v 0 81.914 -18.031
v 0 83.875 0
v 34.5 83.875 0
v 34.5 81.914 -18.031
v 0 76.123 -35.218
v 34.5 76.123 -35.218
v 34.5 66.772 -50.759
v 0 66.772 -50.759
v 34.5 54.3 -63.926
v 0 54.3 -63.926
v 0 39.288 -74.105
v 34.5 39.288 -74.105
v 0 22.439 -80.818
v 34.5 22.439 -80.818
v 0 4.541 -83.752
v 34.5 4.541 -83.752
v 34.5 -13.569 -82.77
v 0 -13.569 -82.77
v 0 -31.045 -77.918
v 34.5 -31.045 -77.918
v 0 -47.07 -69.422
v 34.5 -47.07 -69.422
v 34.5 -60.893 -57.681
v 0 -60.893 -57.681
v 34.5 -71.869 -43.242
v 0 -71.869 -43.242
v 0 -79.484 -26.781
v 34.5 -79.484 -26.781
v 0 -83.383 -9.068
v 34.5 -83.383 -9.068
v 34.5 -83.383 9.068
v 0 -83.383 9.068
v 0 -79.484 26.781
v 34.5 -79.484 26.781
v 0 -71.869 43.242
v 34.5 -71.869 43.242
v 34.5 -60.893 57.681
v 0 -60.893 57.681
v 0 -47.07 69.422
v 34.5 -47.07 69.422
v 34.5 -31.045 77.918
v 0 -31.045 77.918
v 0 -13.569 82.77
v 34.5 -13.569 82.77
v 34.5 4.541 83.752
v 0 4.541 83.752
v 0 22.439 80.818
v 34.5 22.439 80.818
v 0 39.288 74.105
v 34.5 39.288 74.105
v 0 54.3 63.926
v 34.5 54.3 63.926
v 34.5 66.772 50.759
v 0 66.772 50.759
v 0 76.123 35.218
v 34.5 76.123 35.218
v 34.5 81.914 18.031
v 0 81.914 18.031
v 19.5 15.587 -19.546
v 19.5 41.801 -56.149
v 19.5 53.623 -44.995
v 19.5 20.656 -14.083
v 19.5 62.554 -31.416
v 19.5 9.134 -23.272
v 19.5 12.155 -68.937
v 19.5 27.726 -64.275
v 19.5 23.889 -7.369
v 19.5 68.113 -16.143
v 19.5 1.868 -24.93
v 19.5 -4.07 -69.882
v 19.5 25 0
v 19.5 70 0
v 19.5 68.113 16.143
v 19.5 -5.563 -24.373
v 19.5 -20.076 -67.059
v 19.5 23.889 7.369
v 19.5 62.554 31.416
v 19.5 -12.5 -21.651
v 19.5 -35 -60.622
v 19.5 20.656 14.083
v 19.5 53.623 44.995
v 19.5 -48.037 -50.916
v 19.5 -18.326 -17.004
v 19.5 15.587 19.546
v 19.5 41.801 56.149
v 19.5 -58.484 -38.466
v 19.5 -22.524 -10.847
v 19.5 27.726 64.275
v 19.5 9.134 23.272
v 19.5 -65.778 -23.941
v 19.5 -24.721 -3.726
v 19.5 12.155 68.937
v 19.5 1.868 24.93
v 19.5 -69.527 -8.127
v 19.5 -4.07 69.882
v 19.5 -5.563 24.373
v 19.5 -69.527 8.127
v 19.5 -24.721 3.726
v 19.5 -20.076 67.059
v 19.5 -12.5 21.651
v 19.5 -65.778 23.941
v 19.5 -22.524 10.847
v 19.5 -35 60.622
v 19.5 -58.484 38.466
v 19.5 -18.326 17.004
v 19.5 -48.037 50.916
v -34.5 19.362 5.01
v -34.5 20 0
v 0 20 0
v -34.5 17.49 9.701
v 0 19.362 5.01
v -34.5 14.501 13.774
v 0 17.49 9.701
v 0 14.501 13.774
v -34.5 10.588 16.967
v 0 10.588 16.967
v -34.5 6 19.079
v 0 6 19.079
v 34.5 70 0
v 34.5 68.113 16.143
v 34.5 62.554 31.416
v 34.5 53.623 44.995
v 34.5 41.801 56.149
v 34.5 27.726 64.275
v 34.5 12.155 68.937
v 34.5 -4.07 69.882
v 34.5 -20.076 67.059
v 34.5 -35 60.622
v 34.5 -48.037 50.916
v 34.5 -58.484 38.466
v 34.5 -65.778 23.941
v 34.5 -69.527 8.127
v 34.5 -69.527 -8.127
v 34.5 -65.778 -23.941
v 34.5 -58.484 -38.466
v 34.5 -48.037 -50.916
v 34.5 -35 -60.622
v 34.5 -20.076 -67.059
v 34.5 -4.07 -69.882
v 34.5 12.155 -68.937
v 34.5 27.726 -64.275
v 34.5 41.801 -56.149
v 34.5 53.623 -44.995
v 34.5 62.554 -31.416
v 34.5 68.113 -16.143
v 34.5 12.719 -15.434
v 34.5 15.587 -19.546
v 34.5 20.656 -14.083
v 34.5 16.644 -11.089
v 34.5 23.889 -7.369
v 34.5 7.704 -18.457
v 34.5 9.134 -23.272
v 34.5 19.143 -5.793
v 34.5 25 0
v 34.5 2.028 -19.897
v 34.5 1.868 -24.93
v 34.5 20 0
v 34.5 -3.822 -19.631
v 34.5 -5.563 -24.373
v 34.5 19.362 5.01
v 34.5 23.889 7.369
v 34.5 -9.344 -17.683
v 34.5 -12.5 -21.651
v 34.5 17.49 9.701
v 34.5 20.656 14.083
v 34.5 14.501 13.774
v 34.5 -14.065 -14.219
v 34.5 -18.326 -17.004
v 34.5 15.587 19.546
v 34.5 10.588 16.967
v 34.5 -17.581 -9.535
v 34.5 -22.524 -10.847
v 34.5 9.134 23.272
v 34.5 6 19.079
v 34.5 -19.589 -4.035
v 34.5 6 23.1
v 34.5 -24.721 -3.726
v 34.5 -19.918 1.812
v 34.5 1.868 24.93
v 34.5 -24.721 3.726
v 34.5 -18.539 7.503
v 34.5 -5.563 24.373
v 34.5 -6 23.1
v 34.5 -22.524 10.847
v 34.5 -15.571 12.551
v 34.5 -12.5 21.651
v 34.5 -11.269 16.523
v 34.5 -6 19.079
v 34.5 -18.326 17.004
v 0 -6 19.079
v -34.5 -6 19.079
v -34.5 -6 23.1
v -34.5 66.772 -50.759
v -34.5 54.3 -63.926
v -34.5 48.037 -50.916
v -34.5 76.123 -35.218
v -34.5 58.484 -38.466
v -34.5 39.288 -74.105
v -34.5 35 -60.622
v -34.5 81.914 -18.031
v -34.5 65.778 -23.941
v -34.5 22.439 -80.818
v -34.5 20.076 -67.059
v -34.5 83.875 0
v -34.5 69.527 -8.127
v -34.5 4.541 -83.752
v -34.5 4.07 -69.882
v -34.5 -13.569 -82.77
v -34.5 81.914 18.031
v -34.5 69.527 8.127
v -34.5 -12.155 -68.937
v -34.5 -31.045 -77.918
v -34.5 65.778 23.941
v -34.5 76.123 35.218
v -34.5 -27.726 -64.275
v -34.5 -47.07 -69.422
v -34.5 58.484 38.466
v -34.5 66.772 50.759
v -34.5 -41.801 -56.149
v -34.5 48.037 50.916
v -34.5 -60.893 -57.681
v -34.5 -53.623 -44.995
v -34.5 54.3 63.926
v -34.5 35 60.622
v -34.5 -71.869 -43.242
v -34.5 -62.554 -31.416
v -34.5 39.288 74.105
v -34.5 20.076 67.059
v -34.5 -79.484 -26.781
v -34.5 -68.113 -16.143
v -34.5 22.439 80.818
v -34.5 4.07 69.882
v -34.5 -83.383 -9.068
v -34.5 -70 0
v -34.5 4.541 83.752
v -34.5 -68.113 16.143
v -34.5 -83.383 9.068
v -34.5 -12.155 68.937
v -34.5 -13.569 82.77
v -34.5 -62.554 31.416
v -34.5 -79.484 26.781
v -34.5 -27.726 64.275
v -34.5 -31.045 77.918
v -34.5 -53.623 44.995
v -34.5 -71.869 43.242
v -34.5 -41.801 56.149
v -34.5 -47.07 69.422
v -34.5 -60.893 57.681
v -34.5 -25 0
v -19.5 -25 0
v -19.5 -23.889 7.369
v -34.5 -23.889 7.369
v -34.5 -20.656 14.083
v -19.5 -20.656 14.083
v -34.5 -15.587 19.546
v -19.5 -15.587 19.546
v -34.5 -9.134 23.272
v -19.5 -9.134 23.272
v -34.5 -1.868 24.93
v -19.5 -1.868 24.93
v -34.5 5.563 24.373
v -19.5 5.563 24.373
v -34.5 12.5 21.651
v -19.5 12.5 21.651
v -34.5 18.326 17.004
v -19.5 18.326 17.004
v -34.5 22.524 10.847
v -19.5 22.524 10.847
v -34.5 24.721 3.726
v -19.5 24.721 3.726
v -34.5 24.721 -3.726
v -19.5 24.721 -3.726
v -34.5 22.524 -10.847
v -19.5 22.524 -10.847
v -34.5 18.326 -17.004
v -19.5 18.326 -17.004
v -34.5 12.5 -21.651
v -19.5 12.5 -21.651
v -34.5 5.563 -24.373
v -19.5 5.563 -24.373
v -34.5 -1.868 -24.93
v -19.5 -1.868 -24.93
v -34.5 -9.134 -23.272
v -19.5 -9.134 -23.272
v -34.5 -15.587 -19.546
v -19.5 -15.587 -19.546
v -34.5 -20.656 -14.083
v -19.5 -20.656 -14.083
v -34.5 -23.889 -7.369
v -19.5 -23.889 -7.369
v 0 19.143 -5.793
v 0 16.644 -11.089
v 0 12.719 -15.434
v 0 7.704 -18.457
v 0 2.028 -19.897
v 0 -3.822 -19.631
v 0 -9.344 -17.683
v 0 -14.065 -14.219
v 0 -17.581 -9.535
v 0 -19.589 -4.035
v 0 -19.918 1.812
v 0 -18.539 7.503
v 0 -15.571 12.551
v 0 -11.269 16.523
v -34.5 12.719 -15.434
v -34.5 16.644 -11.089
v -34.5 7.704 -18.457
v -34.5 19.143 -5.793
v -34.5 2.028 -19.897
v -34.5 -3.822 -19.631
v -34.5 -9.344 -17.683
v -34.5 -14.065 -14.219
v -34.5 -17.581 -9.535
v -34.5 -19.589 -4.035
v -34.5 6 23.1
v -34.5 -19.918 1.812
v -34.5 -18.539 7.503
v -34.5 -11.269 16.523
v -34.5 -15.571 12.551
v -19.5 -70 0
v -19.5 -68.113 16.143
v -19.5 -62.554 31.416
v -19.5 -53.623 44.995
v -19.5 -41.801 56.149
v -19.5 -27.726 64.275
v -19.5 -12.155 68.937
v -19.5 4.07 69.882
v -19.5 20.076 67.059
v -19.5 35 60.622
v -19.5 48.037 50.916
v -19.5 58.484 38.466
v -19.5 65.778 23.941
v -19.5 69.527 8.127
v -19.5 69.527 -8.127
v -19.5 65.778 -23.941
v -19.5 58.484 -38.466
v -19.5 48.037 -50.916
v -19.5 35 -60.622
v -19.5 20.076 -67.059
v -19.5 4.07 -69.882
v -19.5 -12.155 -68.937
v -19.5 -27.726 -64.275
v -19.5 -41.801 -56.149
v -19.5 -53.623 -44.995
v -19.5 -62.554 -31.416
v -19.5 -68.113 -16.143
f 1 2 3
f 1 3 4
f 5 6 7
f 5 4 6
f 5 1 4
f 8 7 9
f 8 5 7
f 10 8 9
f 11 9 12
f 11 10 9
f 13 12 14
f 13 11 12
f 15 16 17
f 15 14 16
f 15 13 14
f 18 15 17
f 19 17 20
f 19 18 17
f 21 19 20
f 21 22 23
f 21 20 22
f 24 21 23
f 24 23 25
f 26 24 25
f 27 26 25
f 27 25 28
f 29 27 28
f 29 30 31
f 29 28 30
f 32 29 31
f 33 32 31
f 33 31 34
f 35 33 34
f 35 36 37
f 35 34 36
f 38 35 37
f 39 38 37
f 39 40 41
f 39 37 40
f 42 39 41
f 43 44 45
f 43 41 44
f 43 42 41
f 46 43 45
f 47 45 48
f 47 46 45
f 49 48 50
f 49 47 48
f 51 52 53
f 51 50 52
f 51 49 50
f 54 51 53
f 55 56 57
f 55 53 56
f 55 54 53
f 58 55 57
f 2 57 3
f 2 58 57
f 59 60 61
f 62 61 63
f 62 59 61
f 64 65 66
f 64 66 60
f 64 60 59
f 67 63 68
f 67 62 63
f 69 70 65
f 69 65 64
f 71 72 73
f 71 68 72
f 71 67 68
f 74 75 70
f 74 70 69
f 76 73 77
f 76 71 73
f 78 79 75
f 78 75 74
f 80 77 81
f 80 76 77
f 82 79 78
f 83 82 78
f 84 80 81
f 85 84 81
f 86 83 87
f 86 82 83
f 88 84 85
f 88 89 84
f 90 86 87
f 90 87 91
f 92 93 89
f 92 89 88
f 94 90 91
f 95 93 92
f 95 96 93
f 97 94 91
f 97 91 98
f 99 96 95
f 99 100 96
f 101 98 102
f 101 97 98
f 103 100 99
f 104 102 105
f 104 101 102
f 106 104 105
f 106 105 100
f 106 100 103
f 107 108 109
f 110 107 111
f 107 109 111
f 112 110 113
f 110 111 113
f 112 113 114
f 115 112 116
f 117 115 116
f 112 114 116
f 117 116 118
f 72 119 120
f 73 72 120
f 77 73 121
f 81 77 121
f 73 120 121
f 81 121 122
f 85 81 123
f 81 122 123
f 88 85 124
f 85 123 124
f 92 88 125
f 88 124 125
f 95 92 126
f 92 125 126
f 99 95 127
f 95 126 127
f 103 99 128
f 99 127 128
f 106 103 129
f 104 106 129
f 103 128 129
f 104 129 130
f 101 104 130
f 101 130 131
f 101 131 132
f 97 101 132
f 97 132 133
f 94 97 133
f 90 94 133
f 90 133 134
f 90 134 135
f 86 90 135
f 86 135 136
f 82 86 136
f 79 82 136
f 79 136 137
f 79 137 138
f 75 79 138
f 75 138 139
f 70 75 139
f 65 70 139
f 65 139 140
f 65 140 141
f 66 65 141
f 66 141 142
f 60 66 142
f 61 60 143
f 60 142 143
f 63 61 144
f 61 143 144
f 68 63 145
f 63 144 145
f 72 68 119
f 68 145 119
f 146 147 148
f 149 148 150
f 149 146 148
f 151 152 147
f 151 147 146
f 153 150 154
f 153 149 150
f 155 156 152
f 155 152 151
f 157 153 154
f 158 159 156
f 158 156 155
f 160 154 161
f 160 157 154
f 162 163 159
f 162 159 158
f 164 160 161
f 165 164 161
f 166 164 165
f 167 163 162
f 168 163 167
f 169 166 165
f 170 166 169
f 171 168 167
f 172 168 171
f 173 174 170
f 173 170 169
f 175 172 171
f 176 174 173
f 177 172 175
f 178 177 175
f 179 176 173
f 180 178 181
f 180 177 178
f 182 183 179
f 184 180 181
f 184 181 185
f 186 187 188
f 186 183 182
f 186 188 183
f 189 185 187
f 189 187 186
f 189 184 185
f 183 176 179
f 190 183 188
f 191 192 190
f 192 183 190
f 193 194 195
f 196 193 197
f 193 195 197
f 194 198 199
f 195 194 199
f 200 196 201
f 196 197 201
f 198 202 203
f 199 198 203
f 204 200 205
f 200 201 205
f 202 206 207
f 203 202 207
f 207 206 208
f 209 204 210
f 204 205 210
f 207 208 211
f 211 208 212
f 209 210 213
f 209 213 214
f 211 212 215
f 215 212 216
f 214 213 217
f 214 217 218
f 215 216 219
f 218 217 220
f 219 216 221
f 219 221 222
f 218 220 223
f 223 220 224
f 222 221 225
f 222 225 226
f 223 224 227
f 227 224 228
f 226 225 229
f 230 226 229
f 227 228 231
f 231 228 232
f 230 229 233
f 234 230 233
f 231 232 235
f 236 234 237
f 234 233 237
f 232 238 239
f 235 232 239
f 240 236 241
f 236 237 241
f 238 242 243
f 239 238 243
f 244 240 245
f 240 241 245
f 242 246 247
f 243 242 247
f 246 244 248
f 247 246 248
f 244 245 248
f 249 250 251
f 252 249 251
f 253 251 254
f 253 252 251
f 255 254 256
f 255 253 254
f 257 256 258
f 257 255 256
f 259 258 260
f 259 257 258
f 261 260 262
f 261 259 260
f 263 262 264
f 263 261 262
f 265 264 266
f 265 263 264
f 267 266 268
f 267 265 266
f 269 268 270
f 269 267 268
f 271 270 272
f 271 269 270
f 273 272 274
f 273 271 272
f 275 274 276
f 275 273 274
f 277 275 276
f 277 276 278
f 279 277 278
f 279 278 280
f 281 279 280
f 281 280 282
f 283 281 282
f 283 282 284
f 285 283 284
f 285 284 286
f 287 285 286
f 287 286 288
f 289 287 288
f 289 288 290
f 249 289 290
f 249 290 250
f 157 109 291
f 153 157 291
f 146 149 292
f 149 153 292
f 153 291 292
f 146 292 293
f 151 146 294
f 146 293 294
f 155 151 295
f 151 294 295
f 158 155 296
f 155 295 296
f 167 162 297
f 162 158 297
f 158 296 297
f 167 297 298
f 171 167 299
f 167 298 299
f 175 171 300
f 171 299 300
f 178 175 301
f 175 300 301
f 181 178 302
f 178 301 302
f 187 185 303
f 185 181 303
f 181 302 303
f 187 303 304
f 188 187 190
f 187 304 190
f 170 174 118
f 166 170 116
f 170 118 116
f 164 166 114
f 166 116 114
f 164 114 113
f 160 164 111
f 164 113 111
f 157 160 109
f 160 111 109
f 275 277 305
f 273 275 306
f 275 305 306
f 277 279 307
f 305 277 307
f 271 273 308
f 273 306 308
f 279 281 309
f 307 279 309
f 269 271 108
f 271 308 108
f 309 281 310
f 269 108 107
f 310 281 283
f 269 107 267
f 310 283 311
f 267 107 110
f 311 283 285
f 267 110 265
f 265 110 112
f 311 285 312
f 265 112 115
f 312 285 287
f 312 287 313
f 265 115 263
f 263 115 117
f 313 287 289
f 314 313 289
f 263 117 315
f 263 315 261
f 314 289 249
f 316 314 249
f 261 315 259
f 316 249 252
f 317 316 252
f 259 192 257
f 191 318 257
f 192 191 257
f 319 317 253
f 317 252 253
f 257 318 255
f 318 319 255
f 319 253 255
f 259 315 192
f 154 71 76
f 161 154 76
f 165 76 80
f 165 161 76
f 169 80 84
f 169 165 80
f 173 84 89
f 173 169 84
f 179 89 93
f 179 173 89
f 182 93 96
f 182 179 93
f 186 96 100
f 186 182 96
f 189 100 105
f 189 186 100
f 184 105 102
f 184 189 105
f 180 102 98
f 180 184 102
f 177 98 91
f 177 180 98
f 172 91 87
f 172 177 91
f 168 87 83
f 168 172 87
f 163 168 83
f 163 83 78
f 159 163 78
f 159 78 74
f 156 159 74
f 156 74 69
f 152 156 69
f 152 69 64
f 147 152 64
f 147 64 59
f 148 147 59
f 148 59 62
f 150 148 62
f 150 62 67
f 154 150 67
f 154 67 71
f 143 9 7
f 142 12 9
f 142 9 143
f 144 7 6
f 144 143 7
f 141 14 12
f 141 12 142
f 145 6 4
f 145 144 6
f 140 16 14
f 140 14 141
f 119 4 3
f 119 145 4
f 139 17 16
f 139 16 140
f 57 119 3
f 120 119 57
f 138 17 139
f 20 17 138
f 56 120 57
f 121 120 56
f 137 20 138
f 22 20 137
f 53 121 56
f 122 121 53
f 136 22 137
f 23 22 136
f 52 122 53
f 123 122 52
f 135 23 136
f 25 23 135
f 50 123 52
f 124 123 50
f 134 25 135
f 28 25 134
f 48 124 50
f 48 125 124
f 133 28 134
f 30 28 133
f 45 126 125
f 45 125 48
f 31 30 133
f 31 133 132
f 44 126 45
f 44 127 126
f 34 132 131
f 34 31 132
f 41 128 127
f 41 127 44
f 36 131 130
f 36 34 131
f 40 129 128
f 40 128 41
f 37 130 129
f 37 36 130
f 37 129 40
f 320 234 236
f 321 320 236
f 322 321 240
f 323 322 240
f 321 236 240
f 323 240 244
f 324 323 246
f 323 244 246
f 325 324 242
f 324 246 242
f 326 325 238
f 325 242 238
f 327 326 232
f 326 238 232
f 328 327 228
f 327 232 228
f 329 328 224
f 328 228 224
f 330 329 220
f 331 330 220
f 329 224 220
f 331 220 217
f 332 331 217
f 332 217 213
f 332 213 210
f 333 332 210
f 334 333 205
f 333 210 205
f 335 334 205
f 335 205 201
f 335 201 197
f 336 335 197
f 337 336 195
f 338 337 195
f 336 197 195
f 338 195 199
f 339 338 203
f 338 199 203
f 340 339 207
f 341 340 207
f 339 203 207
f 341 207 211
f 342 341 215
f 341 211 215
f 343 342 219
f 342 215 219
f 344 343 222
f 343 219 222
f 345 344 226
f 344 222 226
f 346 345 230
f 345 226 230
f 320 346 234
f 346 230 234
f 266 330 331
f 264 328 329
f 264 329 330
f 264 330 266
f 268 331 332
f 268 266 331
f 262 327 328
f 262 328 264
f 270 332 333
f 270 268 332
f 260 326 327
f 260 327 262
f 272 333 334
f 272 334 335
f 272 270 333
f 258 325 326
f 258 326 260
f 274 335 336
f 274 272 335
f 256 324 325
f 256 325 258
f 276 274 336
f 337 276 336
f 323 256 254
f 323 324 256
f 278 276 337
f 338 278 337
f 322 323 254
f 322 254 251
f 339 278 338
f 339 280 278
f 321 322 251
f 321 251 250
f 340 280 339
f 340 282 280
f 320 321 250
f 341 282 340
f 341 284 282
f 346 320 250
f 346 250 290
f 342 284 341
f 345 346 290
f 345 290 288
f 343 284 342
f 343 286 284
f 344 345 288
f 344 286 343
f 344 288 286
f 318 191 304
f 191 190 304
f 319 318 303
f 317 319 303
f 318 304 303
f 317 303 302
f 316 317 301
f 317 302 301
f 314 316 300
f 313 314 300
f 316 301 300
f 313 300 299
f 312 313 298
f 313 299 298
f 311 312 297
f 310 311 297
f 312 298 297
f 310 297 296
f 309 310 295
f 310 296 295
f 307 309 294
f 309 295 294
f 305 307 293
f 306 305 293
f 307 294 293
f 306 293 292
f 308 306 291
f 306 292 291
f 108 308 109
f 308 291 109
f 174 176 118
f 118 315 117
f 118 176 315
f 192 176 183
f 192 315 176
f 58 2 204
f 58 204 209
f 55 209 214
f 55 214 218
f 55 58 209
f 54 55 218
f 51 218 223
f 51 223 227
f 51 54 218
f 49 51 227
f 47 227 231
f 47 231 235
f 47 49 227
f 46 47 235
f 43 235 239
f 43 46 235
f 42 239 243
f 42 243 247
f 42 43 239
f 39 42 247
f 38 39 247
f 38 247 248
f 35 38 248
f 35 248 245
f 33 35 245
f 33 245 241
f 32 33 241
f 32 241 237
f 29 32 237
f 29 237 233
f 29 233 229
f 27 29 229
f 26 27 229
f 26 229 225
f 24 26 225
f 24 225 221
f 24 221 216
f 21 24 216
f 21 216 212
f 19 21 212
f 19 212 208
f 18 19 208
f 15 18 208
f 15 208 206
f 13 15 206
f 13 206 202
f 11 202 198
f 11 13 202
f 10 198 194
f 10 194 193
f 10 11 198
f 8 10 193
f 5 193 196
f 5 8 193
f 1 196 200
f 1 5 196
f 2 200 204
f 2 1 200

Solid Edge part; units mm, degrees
sketch "Sketch1" plane through (0, 0, 0) normal (1, 0, 0) x (0, 1, 0)
  circle A0 centre (0, 0) radius 20
  circle A1 centre (0, 0) radius 83.875
extrude "Protrusion1" add sketch "Sketch1" along normal mid plane 69
sketch "Sketch2" plane through (34.5, 0, 0) normal (1, 0, 0) x (0, 1, 0)
  circle A0 centre (0, 0) radius 70
  circle A1 centre (0, 0) radius 25
extrude "VaciadoExtruido_1" cut sketch "Sketch2" against normal blind 15
sketch "Sketch3" plane through (-34.5, 0, 0) normal (-1, 0, 0) x (0, -1, 0)
  circle A0 centre (0, 0) radius 70
  circle A1 centre (0, 0) radius 25
extrude "VaciadoExtruido_2" cut sketch "Sketch3" against normal blind 15
sketch "Sketch4" plane through (34.5, 0, 0) normal (1, 0, 0) x (0, 1, 0)
  line L0 (0, 23.1) -> (-6, 23.1)
  line L1 (-6, 23.1) -> (-6, 19.0788)
  line L2 (6, 23.1) -> (6, 19.0788)
  line L3 (0, 23.1) -> (6, 23.1)
  arc A0 (-6, 19.0788) -> (6, 19.0788) centre (0, 0) cw
extrude "Cutout1" cut sketch "Sketch4" along normal mid plane 368
properties material "Acero"
